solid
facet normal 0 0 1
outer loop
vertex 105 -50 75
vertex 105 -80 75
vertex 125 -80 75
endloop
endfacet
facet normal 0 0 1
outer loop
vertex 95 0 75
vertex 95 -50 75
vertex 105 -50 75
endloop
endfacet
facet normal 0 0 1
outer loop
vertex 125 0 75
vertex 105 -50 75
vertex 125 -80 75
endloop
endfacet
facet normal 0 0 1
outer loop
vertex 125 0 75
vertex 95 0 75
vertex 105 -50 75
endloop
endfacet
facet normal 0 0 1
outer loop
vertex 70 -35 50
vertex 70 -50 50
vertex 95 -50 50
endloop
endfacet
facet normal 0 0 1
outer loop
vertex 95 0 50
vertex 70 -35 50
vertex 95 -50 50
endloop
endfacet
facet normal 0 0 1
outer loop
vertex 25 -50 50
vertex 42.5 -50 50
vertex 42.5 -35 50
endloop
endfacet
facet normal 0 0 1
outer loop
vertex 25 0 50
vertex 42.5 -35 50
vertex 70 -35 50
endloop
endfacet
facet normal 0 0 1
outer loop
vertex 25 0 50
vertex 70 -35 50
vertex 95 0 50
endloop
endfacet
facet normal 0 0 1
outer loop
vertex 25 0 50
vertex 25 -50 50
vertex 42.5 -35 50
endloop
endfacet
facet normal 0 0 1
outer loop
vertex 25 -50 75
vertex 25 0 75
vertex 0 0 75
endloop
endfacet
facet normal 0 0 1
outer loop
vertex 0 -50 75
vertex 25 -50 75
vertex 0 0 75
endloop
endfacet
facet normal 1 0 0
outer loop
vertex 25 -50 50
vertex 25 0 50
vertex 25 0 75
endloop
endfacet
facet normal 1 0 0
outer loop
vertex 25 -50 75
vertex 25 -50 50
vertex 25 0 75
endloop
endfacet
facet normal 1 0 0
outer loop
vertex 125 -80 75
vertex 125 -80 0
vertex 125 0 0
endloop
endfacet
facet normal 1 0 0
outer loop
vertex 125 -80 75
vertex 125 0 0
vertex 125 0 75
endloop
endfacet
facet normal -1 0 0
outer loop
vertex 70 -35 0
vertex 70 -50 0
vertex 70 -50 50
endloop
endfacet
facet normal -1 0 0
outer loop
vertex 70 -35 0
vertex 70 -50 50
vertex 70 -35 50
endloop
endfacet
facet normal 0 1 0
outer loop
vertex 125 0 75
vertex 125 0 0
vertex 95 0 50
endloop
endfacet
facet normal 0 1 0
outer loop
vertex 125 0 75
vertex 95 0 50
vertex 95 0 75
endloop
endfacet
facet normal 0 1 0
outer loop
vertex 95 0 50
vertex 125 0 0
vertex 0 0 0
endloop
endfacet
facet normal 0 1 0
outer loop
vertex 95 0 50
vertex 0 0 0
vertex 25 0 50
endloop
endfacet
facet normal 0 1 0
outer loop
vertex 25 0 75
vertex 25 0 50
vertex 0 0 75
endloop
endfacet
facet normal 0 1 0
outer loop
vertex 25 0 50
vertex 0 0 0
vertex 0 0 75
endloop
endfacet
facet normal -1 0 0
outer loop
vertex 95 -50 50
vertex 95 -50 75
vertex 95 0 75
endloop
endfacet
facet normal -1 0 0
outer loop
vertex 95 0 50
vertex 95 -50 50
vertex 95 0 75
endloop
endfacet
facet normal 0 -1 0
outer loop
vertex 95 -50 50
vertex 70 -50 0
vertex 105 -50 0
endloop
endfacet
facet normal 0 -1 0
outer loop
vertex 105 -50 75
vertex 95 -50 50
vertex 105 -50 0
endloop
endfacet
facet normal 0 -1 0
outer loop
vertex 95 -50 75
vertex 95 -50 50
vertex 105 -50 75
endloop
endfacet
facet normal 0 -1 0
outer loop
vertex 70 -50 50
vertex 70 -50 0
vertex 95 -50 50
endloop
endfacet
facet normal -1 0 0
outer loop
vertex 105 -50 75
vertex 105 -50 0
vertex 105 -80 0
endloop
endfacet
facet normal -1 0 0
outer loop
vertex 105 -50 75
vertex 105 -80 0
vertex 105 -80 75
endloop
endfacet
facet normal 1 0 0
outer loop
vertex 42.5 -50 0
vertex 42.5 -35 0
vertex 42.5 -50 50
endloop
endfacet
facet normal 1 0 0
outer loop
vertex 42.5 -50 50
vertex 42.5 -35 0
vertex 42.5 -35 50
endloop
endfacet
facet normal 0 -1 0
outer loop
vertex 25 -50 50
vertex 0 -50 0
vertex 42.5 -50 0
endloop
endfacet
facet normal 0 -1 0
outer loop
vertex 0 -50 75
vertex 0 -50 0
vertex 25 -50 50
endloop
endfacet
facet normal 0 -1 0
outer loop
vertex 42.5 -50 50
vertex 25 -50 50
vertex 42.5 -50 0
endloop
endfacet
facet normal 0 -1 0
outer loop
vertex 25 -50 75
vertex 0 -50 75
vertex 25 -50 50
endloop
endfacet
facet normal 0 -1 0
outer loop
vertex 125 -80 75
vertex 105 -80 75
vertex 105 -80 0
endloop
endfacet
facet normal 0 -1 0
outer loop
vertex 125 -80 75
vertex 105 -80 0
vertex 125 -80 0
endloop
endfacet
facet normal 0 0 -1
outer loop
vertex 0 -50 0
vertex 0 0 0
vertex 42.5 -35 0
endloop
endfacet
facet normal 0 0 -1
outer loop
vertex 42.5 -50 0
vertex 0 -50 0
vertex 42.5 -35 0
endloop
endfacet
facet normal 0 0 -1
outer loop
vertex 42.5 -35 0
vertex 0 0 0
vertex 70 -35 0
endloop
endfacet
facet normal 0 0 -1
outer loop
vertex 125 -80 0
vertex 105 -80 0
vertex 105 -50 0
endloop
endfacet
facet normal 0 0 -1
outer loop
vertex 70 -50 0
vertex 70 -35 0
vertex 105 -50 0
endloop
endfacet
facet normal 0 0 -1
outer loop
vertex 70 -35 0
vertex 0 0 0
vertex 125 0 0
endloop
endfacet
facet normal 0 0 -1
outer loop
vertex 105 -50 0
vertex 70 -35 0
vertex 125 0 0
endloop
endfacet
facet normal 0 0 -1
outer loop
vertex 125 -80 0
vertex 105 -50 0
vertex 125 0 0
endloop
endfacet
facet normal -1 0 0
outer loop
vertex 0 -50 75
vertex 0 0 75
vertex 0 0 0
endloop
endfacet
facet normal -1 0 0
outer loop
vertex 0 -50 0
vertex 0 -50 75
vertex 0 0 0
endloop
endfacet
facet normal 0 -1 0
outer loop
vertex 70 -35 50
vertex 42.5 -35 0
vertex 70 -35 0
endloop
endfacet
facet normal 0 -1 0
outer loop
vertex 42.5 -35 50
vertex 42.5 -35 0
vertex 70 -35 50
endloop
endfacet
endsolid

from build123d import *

# Parameters (mm, degrees)
F0_W     = 17.5
F0_H     = 50
F1_DEPTH = 50
F2_W     = 35
F2_H     = 50
F3_DEPTH = 27.5
F4_W     = 50
F4_H     = 50
F5_DEPTH = 25
F6_W     = 50
F6_H     = 75
F7_DEPTH = 30
F8_W     = 20
F8_H     = 75
F9_DEPTH = 30


with BuildPart() as f1:
    # F0 (on Front) → F1 (new body)
    with BuildSketch(Plane.XZ):
        Polygon((0, 75), (0, 0), (25, 0), (25, 50), (25, 75), align=None)
        with Locations((33.75, 25)):
            Rectangle(F0_W, F0_H)
    extrude(amount=F1_DEPTH)

    # F2 (on face) → F3 (join)
    with BuildSketch(Plane.YZ.offset(42.5)):
        with Locations((-17.5, 25)):
            Rectangle(F2_W, F2_H)
    extrude(amount=F3_DEPTH)

    # F4 (on face) → F5 (join)
    with BuildSketch(Plane.YZ.offset(70)):
        with Locations((-25, 25)):
            Rectangle(F4_W, F4_H)
    extrude(amount=F5_DEPTH)

    # F6 (on face) → F7 (join)
    with BuildSketch(Plane.YZ.offset(95)):
        with Locations((-25, 37.5)):
            Rectangle(F6_W, F6_H)
    extrude(amount=F7_DEPTH)

    # F8 (on face) → F9 (join)
    with BuildSketch(Plane.XZ.offset(50)):
        with Locations((115, 37.5)):
            Rectangle(F8_W, F8_H)
    extrude(amount=F9_DEPTH)


solid = f1.part
